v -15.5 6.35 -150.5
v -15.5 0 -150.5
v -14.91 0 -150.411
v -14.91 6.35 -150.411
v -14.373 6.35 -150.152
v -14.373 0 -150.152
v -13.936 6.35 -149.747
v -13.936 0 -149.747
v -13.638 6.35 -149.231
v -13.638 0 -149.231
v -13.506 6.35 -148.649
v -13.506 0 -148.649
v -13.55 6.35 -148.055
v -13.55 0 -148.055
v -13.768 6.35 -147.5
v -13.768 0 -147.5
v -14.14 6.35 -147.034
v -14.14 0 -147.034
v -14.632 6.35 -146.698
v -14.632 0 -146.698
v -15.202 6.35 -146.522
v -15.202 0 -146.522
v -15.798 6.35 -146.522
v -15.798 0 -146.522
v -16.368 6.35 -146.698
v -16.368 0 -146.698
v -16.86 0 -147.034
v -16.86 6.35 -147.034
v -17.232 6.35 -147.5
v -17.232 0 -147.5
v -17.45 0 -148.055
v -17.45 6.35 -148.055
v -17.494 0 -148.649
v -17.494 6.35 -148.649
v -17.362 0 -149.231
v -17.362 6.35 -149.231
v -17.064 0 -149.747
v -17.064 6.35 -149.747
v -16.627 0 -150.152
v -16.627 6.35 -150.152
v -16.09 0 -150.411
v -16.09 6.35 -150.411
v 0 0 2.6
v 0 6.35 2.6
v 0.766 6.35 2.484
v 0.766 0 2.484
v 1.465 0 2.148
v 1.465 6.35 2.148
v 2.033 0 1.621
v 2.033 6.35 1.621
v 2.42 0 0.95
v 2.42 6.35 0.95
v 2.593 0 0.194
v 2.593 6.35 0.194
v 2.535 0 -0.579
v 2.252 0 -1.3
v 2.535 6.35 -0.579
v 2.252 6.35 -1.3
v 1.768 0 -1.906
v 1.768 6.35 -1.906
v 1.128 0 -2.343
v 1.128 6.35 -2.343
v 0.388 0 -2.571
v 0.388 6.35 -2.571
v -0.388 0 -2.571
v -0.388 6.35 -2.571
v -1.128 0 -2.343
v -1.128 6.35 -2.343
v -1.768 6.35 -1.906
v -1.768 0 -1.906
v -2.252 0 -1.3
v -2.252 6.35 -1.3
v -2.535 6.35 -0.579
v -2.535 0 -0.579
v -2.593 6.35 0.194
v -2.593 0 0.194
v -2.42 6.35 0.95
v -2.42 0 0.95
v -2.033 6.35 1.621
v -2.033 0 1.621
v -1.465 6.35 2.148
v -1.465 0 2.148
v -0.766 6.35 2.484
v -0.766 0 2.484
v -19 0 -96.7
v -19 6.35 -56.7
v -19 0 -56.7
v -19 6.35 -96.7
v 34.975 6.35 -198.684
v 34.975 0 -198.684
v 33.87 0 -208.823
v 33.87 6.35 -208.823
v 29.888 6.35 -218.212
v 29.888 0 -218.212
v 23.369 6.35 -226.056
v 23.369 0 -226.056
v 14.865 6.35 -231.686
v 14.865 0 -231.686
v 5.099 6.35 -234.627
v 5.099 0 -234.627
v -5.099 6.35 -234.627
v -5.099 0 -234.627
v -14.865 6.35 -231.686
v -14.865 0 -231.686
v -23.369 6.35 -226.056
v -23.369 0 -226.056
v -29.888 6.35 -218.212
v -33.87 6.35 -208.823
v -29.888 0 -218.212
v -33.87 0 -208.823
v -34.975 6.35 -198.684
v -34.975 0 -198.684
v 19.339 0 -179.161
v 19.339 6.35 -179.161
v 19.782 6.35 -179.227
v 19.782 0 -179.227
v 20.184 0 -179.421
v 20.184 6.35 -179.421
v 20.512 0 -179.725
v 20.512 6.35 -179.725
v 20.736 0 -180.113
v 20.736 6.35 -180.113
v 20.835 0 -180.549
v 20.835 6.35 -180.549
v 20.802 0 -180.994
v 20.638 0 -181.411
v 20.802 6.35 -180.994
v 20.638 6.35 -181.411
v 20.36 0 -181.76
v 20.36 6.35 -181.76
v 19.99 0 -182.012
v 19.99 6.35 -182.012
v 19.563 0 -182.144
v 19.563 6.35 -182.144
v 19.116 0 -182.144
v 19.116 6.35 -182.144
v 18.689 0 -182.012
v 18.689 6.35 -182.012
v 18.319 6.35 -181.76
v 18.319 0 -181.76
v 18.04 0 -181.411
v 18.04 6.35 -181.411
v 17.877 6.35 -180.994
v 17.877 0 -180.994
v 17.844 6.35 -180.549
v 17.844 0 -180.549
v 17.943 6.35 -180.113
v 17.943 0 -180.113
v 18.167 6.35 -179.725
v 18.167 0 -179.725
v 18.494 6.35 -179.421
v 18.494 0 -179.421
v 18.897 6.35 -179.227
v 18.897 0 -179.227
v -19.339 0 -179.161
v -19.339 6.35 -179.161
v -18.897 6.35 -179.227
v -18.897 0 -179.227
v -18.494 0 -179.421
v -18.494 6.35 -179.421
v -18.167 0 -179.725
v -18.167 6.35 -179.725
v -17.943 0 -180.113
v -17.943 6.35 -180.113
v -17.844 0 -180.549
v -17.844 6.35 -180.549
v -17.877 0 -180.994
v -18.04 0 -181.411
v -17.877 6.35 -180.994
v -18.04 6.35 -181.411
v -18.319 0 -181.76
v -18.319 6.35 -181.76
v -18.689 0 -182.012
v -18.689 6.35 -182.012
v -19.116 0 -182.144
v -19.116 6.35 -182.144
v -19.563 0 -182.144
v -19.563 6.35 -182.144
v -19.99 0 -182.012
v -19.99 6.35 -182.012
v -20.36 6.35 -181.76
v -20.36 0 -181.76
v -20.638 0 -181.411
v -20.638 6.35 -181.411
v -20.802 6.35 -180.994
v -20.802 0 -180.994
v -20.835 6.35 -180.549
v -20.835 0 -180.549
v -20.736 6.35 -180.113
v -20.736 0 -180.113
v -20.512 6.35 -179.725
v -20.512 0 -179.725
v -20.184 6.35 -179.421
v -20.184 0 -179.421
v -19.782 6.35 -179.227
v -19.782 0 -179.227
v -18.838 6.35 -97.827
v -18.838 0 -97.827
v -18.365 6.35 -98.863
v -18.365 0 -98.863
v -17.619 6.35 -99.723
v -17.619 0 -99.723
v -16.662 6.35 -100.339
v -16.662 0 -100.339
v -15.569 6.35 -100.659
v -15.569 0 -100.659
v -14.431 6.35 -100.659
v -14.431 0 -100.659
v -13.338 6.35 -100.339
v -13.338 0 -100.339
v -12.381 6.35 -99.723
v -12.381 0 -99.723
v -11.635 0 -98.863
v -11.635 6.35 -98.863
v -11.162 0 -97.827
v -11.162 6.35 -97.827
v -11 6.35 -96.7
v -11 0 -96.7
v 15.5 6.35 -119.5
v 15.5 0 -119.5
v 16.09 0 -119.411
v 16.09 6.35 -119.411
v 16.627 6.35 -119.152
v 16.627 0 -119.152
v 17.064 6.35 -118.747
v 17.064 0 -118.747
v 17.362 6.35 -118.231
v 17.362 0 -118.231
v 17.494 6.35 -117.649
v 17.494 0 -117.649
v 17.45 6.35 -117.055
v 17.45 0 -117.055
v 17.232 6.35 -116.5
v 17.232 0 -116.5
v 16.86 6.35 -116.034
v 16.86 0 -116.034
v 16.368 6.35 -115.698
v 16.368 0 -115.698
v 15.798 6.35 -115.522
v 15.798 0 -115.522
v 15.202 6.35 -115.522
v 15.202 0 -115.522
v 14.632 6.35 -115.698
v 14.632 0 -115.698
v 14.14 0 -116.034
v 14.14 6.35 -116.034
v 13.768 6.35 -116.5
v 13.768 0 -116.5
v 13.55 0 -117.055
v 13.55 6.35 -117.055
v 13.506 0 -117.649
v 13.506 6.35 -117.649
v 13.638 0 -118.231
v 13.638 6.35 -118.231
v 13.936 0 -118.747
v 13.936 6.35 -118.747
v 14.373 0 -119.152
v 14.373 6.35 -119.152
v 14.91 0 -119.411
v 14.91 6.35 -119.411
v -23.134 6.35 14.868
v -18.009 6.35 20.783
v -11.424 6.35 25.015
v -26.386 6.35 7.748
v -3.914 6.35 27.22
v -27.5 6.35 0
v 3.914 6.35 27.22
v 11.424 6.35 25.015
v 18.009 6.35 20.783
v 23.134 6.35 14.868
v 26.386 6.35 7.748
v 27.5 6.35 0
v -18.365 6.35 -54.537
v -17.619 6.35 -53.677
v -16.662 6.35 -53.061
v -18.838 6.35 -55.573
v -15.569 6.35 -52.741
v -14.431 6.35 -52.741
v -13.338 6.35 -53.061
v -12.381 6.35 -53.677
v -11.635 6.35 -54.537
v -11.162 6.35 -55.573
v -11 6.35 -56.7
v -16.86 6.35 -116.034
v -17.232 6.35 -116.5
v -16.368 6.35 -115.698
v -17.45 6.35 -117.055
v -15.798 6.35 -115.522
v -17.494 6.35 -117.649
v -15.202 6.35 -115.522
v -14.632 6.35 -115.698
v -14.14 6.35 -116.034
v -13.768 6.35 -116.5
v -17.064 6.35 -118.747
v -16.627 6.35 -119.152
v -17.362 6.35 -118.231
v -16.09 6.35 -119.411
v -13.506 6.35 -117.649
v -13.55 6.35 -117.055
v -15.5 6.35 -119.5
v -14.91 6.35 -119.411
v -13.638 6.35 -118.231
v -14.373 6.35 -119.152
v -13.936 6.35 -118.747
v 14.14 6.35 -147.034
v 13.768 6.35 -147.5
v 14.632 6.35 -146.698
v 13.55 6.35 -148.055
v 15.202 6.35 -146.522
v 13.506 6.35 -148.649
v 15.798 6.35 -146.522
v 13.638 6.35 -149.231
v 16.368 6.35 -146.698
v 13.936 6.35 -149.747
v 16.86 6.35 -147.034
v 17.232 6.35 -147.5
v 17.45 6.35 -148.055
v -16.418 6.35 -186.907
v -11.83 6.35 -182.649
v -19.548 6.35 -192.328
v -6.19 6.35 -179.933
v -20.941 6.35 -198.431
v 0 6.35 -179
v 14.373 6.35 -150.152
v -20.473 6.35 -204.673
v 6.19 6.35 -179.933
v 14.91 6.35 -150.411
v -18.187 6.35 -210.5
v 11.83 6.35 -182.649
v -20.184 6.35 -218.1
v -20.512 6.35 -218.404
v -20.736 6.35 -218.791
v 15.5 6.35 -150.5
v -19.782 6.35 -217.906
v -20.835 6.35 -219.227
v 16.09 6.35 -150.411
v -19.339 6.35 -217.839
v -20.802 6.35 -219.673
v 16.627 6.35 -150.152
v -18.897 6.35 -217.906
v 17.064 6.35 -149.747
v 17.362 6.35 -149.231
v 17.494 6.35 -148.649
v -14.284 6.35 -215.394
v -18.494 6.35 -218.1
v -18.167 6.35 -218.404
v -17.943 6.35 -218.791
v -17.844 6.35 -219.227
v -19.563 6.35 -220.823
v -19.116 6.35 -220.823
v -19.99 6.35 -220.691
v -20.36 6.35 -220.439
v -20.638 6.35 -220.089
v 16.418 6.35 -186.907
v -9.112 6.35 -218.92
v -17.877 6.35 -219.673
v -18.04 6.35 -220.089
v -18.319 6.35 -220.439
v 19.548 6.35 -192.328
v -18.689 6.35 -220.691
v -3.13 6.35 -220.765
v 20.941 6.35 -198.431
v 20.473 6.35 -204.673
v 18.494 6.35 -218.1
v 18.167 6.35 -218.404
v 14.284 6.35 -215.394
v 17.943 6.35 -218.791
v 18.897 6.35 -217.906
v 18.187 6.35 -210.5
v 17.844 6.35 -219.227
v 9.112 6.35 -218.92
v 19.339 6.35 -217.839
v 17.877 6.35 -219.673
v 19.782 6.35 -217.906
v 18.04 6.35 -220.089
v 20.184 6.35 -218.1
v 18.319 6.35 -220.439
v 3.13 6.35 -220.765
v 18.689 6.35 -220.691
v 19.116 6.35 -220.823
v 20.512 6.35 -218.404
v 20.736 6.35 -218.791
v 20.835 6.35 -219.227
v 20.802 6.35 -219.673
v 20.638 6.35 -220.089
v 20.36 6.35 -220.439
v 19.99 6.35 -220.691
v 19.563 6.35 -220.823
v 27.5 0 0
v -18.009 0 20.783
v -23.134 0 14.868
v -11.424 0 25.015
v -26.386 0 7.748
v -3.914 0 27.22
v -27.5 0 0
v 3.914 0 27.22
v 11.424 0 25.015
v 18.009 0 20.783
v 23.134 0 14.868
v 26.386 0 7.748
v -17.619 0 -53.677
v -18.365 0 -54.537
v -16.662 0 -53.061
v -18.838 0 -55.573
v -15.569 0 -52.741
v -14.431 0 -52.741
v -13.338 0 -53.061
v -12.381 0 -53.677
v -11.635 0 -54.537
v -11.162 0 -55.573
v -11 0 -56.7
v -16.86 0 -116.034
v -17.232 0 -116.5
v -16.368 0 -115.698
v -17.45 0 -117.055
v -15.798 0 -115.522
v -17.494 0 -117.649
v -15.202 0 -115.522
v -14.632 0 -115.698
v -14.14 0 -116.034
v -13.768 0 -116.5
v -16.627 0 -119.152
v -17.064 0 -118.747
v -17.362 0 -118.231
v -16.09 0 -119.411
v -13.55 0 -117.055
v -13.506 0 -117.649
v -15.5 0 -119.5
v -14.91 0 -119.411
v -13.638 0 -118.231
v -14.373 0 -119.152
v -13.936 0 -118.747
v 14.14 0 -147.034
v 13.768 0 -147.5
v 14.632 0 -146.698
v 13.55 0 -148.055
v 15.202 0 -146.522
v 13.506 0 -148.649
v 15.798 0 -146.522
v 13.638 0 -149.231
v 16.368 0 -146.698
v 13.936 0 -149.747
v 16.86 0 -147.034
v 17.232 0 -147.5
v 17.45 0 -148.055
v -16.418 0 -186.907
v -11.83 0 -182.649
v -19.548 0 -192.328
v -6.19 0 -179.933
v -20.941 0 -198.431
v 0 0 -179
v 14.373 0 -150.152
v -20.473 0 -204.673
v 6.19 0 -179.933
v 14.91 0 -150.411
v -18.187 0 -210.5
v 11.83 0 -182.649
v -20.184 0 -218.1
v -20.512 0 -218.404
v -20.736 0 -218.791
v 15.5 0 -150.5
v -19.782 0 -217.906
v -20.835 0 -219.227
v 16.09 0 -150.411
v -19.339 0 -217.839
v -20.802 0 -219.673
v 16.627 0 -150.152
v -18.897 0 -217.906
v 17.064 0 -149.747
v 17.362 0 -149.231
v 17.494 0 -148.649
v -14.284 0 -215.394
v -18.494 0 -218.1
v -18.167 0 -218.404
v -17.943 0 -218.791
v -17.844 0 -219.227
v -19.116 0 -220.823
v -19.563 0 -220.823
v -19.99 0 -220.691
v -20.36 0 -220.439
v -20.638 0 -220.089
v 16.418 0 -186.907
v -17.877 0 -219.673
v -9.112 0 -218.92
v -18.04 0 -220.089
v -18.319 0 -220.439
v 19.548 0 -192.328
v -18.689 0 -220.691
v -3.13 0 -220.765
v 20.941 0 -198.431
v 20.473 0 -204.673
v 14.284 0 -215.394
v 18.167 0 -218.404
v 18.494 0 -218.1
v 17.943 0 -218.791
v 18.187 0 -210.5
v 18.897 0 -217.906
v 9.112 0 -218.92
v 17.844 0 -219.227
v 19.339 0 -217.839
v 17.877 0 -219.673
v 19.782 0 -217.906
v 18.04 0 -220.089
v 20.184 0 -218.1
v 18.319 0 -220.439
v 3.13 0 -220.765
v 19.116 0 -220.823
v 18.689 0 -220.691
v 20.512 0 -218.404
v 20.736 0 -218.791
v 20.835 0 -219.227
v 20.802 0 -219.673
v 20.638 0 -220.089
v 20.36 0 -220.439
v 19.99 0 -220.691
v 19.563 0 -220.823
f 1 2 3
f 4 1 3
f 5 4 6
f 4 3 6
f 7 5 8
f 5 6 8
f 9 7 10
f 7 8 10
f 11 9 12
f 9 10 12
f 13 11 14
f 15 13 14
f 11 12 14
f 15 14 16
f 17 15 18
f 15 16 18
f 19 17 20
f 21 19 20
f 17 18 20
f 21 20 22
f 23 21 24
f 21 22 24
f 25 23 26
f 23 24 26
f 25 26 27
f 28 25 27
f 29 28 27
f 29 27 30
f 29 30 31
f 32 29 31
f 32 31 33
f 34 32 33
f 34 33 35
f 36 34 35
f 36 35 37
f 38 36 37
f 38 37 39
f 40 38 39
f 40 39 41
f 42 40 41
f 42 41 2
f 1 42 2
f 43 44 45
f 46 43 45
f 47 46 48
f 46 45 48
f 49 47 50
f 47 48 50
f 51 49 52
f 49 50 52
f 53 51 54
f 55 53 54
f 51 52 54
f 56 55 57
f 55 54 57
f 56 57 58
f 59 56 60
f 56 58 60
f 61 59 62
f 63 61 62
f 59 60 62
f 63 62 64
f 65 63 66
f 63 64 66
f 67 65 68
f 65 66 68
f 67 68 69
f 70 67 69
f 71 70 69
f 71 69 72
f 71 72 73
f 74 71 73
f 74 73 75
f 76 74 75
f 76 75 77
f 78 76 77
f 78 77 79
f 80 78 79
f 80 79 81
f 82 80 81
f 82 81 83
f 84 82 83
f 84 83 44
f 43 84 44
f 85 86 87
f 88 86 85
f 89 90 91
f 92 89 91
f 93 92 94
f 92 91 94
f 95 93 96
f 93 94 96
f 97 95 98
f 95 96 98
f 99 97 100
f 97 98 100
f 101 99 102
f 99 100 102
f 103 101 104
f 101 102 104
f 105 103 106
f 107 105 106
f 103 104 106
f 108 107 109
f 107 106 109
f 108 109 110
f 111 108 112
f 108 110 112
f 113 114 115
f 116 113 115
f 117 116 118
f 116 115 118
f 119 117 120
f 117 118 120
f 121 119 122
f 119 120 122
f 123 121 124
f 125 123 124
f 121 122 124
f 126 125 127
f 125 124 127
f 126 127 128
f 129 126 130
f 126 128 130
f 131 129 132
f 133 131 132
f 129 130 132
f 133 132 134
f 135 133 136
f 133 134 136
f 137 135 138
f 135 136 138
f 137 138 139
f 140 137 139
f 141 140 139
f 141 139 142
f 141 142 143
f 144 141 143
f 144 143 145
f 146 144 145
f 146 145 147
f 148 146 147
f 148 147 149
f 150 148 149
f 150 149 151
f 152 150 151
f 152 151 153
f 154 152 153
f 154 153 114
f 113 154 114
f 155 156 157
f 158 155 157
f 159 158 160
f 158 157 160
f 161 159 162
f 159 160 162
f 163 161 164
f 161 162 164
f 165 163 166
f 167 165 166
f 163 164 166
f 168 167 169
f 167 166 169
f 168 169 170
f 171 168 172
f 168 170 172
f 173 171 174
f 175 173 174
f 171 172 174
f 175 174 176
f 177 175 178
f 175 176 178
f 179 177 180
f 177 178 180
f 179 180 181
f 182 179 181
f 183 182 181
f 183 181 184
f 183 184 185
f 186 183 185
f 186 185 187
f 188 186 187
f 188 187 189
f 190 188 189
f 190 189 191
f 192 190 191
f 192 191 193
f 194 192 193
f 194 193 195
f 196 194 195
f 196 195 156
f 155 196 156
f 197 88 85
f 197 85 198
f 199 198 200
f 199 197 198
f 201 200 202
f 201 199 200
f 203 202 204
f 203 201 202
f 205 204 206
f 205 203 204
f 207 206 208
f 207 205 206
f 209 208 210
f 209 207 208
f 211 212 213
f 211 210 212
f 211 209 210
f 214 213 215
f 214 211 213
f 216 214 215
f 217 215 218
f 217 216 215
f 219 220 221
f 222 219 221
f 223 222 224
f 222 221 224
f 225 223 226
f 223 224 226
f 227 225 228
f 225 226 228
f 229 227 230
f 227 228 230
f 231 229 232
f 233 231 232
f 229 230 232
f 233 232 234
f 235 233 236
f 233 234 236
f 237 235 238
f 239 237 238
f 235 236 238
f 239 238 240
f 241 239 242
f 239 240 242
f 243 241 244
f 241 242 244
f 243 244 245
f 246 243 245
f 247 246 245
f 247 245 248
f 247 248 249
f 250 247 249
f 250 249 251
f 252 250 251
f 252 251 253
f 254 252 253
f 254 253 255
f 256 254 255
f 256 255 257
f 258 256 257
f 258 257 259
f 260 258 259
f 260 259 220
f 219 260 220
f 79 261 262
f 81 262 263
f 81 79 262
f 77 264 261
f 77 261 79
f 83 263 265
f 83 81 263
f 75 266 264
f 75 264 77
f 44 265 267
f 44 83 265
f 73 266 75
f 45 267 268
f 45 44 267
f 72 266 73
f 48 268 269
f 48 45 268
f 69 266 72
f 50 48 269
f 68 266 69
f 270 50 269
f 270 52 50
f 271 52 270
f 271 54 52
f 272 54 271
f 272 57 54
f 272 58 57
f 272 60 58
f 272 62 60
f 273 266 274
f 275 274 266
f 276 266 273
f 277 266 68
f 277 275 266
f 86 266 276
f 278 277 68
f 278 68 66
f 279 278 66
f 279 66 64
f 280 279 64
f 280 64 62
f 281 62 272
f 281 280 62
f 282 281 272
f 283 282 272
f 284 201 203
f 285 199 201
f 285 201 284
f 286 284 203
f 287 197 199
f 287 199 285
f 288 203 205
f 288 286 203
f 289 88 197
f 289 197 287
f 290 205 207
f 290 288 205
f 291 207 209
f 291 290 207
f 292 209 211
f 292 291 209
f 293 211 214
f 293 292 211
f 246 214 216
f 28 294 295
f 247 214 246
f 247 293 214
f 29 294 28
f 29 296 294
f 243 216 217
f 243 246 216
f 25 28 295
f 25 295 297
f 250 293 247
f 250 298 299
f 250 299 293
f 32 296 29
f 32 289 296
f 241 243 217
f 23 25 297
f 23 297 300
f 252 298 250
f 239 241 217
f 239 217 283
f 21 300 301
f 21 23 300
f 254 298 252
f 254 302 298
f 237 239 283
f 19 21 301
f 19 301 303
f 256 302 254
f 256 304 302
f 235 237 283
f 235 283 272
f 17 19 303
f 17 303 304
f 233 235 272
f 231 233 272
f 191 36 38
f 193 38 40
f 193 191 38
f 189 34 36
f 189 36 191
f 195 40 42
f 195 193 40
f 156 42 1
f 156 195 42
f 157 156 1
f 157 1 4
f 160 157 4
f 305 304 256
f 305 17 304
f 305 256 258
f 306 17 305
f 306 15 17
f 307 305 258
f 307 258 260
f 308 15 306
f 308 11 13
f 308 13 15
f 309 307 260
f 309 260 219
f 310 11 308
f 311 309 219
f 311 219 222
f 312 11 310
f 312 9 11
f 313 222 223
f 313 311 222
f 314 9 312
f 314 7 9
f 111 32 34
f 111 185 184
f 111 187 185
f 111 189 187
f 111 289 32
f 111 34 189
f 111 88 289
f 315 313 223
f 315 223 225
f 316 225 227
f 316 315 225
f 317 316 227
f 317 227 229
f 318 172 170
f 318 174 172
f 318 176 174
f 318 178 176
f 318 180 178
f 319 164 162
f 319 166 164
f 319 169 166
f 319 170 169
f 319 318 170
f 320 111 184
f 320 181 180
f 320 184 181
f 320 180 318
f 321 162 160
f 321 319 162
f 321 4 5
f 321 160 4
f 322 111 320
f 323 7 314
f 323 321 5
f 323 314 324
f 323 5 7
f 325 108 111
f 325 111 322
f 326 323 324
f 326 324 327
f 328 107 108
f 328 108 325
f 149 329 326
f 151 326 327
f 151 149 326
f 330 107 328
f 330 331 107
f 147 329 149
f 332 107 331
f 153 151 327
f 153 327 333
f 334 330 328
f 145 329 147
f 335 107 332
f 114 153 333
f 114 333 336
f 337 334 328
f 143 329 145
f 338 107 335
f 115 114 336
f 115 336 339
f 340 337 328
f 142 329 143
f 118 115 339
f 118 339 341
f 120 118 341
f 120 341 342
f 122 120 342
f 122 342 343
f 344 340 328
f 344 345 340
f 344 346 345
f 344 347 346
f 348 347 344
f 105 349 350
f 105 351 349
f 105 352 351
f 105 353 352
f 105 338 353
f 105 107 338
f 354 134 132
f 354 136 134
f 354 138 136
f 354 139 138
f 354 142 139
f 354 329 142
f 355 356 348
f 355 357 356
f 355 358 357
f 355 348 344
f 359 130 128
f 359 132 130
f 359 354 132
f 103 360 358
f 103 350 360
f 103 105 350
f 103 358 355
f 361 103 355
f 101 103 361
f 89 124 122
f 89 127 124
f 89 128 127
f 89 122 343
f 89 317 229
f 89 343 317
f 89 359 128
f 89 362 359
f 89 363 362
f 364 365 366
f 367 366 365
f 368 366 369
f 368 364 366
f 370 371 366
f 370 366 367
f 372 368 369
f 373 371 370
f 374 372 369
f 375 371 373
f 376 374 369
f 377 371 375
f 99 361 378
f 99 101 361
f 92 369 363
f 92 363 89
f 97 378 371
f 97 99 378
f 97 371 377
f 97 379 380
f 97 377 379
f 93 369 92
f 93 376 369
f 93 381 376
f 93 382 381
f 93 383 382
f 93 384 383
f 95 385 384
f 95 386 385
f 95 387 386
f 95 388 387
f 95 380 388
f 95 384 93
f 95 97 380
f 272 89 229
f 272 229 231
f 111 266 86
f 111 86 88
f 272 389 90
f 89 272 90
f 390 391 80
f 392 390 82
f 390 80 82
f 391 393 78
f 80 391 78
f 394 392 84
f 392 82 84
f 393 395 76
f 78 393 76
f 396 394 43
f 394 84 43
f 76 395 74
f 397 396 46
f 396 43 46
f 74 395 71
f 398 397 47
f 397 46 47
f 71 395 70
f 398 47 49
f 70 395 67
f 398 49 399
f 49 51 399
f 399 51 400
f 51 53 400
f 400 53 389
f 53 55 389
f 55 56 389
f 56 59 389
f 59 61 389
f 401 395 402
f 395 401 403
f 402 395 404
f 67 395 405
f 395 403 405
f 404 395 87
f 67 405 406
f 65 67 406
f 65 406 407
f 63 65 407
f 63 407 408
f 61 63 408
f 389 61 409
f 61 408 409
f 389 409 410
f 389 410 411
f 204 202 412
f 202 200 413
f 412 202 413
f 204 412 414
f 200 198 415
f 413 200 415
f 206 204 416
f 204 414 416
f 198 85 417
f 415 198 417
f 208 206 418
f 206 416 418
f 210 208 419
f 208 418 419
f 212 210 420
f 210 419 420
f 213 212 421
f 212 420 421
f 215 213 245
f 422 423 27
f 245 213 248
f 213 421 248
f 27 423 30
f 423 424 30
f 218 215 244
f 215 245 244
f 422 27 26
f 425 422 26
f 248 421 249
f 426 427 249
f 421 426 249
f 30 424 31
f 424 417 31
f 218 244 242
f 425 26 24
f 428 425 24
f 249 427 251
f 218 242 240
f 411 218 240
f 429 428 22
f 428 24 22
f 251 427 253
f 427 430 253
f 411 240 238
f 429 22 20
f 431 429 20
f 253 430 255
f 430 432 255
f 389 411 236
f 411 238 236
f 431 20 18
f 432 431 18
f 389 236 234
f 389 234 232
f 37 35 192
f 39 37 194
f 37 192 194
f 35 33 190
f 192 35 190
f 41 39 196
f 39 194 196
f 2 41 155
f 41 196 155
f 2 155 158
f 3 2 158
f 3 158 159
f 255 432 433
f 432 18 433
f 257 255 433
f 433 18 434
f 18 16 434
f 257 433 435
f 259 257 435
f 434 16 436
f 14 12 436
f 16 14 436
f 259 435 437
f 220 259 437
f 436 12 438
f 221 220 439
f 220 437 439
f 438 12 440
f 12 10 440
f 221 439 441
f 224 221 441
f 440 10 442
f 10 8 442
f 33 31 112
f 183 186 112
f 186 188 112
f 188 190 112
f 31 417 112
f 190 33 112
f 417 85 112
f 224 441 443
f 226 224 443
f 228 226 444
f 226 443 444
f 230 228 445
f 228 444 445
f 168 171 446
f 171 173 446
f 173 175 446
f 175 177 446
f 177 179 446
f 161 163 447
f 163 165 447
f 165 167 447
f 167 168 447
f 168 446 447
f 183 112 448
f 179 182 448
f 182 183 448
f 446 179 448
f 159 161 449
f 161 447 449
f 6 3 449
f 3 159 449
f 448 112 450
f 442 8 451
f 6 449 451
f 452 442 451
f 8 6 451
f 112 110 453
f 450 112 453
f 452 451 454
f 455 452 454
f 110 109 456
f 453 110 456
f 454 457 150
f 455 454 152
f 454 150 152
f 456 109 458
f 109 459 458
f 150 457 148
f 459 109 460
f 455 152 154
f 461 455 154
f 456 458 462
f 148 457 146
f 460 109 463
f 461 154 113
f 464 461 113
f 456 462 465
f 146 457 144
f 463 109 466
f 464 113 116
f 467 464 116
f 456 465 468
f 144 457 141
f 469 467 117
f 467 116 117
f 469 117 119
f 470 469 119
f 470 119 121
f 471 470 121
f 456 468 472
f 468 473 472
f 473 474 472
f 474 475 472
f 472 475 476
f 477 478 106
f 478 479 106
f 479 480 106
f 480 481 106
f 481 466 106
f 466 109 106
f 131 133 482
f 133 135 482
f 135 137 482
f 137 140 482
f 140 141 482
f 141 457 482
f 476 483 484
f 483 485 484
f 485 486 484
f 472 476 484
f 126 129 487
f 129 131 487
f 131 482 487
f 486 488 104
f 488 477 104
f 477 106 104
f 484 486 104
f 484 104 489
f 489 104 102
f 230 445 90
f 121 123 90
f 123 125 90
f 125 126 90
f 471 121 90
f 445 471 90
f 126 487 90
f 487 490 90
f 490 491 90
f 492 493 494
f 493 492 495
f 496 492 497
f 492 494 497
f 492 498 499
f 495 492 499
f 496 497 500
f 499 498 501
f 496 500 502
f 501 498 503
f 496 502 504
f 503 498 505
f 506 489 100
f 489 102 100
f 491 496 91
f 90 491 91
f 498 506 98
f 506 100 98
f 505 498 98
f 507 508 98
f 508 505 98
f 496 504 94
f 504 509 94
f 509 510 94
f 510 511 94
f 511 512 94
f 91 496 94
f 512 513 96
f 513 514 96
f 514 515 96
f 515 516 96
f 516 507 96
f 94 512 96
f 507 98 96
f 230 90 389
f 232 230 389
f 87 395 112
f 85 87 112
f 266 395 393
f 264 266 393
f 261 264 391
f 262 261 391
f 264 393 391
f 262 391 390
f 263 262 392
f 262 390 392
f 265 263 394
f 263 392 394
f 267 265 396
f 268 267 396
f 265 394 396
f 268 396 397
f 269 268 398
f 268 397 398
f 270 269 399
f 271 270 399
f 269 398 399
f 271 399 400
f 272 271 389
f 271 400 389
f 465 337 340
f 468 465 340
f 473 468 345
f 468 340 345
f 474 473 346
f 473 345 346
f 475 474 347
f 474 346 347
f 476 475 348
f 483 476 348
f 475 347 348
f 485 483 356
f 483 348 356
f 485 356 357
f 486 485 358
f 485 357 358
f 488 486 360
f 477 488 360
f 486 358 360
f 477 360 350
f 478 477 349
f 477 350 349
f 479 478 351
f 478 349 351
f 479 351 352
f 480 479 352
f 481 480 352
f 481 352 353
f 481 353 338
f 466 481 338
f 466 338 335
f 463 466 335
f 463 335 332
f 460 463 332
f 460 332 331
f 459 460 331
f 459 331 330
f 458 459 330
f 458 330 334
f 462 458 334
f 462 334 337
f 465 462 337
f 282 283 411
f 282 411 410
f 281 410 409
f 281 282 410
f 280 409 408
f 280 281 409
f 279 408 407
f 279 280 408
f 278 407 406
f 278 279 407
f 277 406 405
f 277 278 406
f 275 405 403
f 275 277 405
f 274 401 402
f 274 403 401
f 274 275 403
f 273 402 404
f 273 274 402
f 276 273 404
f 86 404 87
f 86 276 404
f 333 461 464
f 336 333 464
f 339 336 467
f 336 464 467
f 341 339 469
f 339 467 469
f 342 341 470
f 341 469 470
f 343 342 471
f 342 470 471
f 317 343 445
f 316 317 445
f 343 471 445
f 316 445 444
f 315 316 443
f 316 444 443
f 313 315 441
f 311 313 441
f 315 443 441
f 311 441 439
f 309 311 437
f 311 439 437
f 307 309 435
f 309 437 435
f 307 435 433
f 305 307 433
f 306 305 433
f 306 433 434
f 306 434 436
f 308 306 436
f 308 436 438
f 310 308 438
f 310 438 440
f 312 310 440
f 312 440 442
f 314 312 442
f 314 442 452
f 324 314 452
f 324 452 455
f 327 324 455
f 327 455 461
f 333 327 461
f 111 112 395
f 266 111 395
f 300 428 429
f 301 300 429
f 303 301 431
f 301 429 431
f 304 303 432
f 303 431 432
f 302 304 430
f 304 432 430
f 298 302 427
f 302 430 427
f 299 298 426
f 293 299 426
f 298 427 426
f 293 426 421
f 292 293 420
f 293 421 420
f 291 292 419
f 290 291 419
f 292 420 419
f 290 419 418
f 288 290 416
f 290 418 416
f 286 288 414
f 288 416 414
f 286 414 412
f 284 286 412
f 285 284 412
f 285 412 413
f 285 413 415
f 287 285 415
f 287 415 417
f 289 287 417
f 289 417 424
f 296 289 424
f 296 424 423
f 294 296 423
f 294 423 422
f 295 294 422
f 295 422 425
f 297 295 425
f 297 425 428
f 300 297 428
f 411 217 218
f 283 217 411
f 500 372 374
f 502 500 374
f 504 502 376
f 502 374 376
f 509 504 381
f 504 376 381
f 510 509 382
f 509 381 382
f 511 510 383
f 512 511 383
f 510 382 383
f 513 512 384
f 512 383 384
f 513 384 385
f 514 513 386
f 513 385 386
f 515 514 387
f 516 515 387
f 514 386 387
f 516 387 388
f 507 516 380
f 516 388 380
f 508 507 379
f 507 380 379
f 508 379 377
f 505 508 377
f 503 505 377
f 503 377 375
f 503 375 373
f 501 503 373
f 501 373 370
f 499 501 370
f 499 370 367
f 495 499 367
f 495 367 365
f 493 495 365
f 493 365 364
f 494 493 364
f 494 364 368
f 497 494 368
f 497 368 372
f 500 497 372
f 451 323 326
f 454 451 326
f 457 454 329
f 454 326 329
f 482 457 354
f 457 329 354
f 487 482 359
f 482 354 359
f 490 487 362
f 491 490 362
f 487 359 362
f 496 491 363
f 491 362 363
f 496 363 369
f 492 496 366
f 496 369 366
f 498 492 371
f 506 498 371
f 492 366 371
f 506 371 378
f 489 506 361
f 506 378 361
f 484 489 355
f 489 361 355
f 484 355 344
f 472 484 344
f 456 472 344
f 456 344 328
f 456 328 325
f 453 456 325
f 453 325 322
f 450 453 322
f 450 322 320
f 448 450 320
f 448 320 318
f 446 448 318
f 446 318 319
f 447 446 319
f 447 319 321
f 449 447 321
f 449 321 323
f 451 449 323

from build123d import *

# Parameters (mm, degrees)
BOSS_EXTRUDE1_DEPTH     = 6.35
SKETCH2_R               = 2.6
CUT_EXTRUDE1_DEPTH      = 238.676928834
ESQUISSE3_R             = 21
ENL_V_MAT_EXTRU_2_DEPTH = 238.676928834
ESQUISSE7_R             = 1.5
ENL_V_MAT_EXTRU_3_DEPTH = 238.676928834
CUT_EXTRUDE3_DEPTH      = 238.676928834
SKETCH5_R               = 2
CUT_EXTRUDE4_DEPTH      = 238.676928834


with BuildPart() as part:
    # Sketch1 → Boss-Extrude1 (new body)
    with BuildSketch(Plane(origin=(0, 0, 0), x_dir=(1, 0, 0), z_dir=(0, 1, 0))):
        with BuildLine():
            Line((27.5, 0), (34.975254116, 198.684097441))
            ThreePointArc((34.975254116, 198.684097441), (0, 235), (-34.975254116, 198.684097441))
            Line((-34.975254116, 198.684097441), (-27.5, 0))
            ThreePointArc((-27.5, 0), (0, -27.5), (27.5, 0))
        make_face()
    extrude(amount=BOSS_EXTRUDE1_DEPTH)

    # Sketch2 → Cut-Extrude1 (cut, through all)
    with BuildSketch(Plane(origin=(0, 6.35, 0), x_dir=(1, 0, 0), z_dir=(0, 1, 0))):
        with Locations(Location((0, 0, 0), (0, 0, 270))):
            Circle(SKETCH2_R)
    extrude(amount=-CUT_EXTRUDE1_DEPTH, mode=Mode.SUBTRACT)

    # Esquisse3 → Enlèv. mat.-Extru.2 (cut, through all)
    with BuildSketch(Plane(origin=(0, 6.35, 0), x_dir=(1, 0, 0), z_dir=(0, 1, 0))):
        with Locations(Location((0, 200, 0), (0, 0, 270))):
            Circle(ESQUISSE3_R)
    extrude(amount=-ENL_V_MAT_EXTRU_2_DEPTH, mode=Mode.SUBTRACT)

    # Esquisse7 → Enlèv. mat.-Extru.3 (cut, through all)
    with BuildSketch(Plane(origin=(0, 6.35, 0), x_dir=(1, 0, 0), z_dir=(0, 1, 0))):
        with Locations(Location((-19.339370465, 219.339370465, 0), (0, 0, 270))):
            Circle(ESQUISSE7_R)
        with Locations(Location((19.339370465, 219.339370465, 0), (0, 0, 270))):
            Circle(ESQUISSE7_R)
        with Locations(Location((19.339370465, 180.660629535, 0), (0, 0, 270))):
            Circle(ESQUISSE7_R)
        with Locations(Location((-19.339370465, 180.660629535, 0), (0, 0, 270))):
            Circle(ESQUISSE7_R)
    extrude(amount=-ENL_V_MAT_EXTRU_3_DEPTH, mode=Mode.SUBTRACT)

    # Sketch4 → Cut-Extrude3 (cut, through all)
    with BuildSketch(Plane(origin=(0, 6.35, 0), x_dir=(1, 0, 0), z_dir=(0, 1, 0))):
        with BuildLine():
            Line((-19, 56.7), (-19, 96.7))
            ThreePointArc((-19, 96.7), (-15, 100.7), (-11, 96.7))
            Line((-11, 96.7), (-11, 56.7))
            ThreePointArc((-11, 56.7), (-15, 52.7), (-19, 56.7))
        make_face()
    extrude(amount=-CUT_EXTRUDE3_DEPTH, mode=Mode.SUBTRACT)

    # Sketch5 → Cut-Extrude4 (cut, through all)
    with BuildSketch(Plane.XZ):
        with Locations(Location((15.5, -117.5, 0), (0, 0, 270))):
            Circle(SKETCH5_R)
        with Locations(Location((15.5, -148.5, 0), (0, 0, 270))):
            Circle(SKETCH5_R)
        with Locations(Location((-15.5, -148.5, 0), (0, 0, 270))):
            Circle(SKETCH5_R)
        with Locations(Location((-15.5, -117.5, 0), (0, 0, 270))):
            Circle(SKETCH5_R)
    extrude(amount=-CUT_EXTRUDE4_DEPTH, mode=Mode.SUBTRACT)


solid = part.part
